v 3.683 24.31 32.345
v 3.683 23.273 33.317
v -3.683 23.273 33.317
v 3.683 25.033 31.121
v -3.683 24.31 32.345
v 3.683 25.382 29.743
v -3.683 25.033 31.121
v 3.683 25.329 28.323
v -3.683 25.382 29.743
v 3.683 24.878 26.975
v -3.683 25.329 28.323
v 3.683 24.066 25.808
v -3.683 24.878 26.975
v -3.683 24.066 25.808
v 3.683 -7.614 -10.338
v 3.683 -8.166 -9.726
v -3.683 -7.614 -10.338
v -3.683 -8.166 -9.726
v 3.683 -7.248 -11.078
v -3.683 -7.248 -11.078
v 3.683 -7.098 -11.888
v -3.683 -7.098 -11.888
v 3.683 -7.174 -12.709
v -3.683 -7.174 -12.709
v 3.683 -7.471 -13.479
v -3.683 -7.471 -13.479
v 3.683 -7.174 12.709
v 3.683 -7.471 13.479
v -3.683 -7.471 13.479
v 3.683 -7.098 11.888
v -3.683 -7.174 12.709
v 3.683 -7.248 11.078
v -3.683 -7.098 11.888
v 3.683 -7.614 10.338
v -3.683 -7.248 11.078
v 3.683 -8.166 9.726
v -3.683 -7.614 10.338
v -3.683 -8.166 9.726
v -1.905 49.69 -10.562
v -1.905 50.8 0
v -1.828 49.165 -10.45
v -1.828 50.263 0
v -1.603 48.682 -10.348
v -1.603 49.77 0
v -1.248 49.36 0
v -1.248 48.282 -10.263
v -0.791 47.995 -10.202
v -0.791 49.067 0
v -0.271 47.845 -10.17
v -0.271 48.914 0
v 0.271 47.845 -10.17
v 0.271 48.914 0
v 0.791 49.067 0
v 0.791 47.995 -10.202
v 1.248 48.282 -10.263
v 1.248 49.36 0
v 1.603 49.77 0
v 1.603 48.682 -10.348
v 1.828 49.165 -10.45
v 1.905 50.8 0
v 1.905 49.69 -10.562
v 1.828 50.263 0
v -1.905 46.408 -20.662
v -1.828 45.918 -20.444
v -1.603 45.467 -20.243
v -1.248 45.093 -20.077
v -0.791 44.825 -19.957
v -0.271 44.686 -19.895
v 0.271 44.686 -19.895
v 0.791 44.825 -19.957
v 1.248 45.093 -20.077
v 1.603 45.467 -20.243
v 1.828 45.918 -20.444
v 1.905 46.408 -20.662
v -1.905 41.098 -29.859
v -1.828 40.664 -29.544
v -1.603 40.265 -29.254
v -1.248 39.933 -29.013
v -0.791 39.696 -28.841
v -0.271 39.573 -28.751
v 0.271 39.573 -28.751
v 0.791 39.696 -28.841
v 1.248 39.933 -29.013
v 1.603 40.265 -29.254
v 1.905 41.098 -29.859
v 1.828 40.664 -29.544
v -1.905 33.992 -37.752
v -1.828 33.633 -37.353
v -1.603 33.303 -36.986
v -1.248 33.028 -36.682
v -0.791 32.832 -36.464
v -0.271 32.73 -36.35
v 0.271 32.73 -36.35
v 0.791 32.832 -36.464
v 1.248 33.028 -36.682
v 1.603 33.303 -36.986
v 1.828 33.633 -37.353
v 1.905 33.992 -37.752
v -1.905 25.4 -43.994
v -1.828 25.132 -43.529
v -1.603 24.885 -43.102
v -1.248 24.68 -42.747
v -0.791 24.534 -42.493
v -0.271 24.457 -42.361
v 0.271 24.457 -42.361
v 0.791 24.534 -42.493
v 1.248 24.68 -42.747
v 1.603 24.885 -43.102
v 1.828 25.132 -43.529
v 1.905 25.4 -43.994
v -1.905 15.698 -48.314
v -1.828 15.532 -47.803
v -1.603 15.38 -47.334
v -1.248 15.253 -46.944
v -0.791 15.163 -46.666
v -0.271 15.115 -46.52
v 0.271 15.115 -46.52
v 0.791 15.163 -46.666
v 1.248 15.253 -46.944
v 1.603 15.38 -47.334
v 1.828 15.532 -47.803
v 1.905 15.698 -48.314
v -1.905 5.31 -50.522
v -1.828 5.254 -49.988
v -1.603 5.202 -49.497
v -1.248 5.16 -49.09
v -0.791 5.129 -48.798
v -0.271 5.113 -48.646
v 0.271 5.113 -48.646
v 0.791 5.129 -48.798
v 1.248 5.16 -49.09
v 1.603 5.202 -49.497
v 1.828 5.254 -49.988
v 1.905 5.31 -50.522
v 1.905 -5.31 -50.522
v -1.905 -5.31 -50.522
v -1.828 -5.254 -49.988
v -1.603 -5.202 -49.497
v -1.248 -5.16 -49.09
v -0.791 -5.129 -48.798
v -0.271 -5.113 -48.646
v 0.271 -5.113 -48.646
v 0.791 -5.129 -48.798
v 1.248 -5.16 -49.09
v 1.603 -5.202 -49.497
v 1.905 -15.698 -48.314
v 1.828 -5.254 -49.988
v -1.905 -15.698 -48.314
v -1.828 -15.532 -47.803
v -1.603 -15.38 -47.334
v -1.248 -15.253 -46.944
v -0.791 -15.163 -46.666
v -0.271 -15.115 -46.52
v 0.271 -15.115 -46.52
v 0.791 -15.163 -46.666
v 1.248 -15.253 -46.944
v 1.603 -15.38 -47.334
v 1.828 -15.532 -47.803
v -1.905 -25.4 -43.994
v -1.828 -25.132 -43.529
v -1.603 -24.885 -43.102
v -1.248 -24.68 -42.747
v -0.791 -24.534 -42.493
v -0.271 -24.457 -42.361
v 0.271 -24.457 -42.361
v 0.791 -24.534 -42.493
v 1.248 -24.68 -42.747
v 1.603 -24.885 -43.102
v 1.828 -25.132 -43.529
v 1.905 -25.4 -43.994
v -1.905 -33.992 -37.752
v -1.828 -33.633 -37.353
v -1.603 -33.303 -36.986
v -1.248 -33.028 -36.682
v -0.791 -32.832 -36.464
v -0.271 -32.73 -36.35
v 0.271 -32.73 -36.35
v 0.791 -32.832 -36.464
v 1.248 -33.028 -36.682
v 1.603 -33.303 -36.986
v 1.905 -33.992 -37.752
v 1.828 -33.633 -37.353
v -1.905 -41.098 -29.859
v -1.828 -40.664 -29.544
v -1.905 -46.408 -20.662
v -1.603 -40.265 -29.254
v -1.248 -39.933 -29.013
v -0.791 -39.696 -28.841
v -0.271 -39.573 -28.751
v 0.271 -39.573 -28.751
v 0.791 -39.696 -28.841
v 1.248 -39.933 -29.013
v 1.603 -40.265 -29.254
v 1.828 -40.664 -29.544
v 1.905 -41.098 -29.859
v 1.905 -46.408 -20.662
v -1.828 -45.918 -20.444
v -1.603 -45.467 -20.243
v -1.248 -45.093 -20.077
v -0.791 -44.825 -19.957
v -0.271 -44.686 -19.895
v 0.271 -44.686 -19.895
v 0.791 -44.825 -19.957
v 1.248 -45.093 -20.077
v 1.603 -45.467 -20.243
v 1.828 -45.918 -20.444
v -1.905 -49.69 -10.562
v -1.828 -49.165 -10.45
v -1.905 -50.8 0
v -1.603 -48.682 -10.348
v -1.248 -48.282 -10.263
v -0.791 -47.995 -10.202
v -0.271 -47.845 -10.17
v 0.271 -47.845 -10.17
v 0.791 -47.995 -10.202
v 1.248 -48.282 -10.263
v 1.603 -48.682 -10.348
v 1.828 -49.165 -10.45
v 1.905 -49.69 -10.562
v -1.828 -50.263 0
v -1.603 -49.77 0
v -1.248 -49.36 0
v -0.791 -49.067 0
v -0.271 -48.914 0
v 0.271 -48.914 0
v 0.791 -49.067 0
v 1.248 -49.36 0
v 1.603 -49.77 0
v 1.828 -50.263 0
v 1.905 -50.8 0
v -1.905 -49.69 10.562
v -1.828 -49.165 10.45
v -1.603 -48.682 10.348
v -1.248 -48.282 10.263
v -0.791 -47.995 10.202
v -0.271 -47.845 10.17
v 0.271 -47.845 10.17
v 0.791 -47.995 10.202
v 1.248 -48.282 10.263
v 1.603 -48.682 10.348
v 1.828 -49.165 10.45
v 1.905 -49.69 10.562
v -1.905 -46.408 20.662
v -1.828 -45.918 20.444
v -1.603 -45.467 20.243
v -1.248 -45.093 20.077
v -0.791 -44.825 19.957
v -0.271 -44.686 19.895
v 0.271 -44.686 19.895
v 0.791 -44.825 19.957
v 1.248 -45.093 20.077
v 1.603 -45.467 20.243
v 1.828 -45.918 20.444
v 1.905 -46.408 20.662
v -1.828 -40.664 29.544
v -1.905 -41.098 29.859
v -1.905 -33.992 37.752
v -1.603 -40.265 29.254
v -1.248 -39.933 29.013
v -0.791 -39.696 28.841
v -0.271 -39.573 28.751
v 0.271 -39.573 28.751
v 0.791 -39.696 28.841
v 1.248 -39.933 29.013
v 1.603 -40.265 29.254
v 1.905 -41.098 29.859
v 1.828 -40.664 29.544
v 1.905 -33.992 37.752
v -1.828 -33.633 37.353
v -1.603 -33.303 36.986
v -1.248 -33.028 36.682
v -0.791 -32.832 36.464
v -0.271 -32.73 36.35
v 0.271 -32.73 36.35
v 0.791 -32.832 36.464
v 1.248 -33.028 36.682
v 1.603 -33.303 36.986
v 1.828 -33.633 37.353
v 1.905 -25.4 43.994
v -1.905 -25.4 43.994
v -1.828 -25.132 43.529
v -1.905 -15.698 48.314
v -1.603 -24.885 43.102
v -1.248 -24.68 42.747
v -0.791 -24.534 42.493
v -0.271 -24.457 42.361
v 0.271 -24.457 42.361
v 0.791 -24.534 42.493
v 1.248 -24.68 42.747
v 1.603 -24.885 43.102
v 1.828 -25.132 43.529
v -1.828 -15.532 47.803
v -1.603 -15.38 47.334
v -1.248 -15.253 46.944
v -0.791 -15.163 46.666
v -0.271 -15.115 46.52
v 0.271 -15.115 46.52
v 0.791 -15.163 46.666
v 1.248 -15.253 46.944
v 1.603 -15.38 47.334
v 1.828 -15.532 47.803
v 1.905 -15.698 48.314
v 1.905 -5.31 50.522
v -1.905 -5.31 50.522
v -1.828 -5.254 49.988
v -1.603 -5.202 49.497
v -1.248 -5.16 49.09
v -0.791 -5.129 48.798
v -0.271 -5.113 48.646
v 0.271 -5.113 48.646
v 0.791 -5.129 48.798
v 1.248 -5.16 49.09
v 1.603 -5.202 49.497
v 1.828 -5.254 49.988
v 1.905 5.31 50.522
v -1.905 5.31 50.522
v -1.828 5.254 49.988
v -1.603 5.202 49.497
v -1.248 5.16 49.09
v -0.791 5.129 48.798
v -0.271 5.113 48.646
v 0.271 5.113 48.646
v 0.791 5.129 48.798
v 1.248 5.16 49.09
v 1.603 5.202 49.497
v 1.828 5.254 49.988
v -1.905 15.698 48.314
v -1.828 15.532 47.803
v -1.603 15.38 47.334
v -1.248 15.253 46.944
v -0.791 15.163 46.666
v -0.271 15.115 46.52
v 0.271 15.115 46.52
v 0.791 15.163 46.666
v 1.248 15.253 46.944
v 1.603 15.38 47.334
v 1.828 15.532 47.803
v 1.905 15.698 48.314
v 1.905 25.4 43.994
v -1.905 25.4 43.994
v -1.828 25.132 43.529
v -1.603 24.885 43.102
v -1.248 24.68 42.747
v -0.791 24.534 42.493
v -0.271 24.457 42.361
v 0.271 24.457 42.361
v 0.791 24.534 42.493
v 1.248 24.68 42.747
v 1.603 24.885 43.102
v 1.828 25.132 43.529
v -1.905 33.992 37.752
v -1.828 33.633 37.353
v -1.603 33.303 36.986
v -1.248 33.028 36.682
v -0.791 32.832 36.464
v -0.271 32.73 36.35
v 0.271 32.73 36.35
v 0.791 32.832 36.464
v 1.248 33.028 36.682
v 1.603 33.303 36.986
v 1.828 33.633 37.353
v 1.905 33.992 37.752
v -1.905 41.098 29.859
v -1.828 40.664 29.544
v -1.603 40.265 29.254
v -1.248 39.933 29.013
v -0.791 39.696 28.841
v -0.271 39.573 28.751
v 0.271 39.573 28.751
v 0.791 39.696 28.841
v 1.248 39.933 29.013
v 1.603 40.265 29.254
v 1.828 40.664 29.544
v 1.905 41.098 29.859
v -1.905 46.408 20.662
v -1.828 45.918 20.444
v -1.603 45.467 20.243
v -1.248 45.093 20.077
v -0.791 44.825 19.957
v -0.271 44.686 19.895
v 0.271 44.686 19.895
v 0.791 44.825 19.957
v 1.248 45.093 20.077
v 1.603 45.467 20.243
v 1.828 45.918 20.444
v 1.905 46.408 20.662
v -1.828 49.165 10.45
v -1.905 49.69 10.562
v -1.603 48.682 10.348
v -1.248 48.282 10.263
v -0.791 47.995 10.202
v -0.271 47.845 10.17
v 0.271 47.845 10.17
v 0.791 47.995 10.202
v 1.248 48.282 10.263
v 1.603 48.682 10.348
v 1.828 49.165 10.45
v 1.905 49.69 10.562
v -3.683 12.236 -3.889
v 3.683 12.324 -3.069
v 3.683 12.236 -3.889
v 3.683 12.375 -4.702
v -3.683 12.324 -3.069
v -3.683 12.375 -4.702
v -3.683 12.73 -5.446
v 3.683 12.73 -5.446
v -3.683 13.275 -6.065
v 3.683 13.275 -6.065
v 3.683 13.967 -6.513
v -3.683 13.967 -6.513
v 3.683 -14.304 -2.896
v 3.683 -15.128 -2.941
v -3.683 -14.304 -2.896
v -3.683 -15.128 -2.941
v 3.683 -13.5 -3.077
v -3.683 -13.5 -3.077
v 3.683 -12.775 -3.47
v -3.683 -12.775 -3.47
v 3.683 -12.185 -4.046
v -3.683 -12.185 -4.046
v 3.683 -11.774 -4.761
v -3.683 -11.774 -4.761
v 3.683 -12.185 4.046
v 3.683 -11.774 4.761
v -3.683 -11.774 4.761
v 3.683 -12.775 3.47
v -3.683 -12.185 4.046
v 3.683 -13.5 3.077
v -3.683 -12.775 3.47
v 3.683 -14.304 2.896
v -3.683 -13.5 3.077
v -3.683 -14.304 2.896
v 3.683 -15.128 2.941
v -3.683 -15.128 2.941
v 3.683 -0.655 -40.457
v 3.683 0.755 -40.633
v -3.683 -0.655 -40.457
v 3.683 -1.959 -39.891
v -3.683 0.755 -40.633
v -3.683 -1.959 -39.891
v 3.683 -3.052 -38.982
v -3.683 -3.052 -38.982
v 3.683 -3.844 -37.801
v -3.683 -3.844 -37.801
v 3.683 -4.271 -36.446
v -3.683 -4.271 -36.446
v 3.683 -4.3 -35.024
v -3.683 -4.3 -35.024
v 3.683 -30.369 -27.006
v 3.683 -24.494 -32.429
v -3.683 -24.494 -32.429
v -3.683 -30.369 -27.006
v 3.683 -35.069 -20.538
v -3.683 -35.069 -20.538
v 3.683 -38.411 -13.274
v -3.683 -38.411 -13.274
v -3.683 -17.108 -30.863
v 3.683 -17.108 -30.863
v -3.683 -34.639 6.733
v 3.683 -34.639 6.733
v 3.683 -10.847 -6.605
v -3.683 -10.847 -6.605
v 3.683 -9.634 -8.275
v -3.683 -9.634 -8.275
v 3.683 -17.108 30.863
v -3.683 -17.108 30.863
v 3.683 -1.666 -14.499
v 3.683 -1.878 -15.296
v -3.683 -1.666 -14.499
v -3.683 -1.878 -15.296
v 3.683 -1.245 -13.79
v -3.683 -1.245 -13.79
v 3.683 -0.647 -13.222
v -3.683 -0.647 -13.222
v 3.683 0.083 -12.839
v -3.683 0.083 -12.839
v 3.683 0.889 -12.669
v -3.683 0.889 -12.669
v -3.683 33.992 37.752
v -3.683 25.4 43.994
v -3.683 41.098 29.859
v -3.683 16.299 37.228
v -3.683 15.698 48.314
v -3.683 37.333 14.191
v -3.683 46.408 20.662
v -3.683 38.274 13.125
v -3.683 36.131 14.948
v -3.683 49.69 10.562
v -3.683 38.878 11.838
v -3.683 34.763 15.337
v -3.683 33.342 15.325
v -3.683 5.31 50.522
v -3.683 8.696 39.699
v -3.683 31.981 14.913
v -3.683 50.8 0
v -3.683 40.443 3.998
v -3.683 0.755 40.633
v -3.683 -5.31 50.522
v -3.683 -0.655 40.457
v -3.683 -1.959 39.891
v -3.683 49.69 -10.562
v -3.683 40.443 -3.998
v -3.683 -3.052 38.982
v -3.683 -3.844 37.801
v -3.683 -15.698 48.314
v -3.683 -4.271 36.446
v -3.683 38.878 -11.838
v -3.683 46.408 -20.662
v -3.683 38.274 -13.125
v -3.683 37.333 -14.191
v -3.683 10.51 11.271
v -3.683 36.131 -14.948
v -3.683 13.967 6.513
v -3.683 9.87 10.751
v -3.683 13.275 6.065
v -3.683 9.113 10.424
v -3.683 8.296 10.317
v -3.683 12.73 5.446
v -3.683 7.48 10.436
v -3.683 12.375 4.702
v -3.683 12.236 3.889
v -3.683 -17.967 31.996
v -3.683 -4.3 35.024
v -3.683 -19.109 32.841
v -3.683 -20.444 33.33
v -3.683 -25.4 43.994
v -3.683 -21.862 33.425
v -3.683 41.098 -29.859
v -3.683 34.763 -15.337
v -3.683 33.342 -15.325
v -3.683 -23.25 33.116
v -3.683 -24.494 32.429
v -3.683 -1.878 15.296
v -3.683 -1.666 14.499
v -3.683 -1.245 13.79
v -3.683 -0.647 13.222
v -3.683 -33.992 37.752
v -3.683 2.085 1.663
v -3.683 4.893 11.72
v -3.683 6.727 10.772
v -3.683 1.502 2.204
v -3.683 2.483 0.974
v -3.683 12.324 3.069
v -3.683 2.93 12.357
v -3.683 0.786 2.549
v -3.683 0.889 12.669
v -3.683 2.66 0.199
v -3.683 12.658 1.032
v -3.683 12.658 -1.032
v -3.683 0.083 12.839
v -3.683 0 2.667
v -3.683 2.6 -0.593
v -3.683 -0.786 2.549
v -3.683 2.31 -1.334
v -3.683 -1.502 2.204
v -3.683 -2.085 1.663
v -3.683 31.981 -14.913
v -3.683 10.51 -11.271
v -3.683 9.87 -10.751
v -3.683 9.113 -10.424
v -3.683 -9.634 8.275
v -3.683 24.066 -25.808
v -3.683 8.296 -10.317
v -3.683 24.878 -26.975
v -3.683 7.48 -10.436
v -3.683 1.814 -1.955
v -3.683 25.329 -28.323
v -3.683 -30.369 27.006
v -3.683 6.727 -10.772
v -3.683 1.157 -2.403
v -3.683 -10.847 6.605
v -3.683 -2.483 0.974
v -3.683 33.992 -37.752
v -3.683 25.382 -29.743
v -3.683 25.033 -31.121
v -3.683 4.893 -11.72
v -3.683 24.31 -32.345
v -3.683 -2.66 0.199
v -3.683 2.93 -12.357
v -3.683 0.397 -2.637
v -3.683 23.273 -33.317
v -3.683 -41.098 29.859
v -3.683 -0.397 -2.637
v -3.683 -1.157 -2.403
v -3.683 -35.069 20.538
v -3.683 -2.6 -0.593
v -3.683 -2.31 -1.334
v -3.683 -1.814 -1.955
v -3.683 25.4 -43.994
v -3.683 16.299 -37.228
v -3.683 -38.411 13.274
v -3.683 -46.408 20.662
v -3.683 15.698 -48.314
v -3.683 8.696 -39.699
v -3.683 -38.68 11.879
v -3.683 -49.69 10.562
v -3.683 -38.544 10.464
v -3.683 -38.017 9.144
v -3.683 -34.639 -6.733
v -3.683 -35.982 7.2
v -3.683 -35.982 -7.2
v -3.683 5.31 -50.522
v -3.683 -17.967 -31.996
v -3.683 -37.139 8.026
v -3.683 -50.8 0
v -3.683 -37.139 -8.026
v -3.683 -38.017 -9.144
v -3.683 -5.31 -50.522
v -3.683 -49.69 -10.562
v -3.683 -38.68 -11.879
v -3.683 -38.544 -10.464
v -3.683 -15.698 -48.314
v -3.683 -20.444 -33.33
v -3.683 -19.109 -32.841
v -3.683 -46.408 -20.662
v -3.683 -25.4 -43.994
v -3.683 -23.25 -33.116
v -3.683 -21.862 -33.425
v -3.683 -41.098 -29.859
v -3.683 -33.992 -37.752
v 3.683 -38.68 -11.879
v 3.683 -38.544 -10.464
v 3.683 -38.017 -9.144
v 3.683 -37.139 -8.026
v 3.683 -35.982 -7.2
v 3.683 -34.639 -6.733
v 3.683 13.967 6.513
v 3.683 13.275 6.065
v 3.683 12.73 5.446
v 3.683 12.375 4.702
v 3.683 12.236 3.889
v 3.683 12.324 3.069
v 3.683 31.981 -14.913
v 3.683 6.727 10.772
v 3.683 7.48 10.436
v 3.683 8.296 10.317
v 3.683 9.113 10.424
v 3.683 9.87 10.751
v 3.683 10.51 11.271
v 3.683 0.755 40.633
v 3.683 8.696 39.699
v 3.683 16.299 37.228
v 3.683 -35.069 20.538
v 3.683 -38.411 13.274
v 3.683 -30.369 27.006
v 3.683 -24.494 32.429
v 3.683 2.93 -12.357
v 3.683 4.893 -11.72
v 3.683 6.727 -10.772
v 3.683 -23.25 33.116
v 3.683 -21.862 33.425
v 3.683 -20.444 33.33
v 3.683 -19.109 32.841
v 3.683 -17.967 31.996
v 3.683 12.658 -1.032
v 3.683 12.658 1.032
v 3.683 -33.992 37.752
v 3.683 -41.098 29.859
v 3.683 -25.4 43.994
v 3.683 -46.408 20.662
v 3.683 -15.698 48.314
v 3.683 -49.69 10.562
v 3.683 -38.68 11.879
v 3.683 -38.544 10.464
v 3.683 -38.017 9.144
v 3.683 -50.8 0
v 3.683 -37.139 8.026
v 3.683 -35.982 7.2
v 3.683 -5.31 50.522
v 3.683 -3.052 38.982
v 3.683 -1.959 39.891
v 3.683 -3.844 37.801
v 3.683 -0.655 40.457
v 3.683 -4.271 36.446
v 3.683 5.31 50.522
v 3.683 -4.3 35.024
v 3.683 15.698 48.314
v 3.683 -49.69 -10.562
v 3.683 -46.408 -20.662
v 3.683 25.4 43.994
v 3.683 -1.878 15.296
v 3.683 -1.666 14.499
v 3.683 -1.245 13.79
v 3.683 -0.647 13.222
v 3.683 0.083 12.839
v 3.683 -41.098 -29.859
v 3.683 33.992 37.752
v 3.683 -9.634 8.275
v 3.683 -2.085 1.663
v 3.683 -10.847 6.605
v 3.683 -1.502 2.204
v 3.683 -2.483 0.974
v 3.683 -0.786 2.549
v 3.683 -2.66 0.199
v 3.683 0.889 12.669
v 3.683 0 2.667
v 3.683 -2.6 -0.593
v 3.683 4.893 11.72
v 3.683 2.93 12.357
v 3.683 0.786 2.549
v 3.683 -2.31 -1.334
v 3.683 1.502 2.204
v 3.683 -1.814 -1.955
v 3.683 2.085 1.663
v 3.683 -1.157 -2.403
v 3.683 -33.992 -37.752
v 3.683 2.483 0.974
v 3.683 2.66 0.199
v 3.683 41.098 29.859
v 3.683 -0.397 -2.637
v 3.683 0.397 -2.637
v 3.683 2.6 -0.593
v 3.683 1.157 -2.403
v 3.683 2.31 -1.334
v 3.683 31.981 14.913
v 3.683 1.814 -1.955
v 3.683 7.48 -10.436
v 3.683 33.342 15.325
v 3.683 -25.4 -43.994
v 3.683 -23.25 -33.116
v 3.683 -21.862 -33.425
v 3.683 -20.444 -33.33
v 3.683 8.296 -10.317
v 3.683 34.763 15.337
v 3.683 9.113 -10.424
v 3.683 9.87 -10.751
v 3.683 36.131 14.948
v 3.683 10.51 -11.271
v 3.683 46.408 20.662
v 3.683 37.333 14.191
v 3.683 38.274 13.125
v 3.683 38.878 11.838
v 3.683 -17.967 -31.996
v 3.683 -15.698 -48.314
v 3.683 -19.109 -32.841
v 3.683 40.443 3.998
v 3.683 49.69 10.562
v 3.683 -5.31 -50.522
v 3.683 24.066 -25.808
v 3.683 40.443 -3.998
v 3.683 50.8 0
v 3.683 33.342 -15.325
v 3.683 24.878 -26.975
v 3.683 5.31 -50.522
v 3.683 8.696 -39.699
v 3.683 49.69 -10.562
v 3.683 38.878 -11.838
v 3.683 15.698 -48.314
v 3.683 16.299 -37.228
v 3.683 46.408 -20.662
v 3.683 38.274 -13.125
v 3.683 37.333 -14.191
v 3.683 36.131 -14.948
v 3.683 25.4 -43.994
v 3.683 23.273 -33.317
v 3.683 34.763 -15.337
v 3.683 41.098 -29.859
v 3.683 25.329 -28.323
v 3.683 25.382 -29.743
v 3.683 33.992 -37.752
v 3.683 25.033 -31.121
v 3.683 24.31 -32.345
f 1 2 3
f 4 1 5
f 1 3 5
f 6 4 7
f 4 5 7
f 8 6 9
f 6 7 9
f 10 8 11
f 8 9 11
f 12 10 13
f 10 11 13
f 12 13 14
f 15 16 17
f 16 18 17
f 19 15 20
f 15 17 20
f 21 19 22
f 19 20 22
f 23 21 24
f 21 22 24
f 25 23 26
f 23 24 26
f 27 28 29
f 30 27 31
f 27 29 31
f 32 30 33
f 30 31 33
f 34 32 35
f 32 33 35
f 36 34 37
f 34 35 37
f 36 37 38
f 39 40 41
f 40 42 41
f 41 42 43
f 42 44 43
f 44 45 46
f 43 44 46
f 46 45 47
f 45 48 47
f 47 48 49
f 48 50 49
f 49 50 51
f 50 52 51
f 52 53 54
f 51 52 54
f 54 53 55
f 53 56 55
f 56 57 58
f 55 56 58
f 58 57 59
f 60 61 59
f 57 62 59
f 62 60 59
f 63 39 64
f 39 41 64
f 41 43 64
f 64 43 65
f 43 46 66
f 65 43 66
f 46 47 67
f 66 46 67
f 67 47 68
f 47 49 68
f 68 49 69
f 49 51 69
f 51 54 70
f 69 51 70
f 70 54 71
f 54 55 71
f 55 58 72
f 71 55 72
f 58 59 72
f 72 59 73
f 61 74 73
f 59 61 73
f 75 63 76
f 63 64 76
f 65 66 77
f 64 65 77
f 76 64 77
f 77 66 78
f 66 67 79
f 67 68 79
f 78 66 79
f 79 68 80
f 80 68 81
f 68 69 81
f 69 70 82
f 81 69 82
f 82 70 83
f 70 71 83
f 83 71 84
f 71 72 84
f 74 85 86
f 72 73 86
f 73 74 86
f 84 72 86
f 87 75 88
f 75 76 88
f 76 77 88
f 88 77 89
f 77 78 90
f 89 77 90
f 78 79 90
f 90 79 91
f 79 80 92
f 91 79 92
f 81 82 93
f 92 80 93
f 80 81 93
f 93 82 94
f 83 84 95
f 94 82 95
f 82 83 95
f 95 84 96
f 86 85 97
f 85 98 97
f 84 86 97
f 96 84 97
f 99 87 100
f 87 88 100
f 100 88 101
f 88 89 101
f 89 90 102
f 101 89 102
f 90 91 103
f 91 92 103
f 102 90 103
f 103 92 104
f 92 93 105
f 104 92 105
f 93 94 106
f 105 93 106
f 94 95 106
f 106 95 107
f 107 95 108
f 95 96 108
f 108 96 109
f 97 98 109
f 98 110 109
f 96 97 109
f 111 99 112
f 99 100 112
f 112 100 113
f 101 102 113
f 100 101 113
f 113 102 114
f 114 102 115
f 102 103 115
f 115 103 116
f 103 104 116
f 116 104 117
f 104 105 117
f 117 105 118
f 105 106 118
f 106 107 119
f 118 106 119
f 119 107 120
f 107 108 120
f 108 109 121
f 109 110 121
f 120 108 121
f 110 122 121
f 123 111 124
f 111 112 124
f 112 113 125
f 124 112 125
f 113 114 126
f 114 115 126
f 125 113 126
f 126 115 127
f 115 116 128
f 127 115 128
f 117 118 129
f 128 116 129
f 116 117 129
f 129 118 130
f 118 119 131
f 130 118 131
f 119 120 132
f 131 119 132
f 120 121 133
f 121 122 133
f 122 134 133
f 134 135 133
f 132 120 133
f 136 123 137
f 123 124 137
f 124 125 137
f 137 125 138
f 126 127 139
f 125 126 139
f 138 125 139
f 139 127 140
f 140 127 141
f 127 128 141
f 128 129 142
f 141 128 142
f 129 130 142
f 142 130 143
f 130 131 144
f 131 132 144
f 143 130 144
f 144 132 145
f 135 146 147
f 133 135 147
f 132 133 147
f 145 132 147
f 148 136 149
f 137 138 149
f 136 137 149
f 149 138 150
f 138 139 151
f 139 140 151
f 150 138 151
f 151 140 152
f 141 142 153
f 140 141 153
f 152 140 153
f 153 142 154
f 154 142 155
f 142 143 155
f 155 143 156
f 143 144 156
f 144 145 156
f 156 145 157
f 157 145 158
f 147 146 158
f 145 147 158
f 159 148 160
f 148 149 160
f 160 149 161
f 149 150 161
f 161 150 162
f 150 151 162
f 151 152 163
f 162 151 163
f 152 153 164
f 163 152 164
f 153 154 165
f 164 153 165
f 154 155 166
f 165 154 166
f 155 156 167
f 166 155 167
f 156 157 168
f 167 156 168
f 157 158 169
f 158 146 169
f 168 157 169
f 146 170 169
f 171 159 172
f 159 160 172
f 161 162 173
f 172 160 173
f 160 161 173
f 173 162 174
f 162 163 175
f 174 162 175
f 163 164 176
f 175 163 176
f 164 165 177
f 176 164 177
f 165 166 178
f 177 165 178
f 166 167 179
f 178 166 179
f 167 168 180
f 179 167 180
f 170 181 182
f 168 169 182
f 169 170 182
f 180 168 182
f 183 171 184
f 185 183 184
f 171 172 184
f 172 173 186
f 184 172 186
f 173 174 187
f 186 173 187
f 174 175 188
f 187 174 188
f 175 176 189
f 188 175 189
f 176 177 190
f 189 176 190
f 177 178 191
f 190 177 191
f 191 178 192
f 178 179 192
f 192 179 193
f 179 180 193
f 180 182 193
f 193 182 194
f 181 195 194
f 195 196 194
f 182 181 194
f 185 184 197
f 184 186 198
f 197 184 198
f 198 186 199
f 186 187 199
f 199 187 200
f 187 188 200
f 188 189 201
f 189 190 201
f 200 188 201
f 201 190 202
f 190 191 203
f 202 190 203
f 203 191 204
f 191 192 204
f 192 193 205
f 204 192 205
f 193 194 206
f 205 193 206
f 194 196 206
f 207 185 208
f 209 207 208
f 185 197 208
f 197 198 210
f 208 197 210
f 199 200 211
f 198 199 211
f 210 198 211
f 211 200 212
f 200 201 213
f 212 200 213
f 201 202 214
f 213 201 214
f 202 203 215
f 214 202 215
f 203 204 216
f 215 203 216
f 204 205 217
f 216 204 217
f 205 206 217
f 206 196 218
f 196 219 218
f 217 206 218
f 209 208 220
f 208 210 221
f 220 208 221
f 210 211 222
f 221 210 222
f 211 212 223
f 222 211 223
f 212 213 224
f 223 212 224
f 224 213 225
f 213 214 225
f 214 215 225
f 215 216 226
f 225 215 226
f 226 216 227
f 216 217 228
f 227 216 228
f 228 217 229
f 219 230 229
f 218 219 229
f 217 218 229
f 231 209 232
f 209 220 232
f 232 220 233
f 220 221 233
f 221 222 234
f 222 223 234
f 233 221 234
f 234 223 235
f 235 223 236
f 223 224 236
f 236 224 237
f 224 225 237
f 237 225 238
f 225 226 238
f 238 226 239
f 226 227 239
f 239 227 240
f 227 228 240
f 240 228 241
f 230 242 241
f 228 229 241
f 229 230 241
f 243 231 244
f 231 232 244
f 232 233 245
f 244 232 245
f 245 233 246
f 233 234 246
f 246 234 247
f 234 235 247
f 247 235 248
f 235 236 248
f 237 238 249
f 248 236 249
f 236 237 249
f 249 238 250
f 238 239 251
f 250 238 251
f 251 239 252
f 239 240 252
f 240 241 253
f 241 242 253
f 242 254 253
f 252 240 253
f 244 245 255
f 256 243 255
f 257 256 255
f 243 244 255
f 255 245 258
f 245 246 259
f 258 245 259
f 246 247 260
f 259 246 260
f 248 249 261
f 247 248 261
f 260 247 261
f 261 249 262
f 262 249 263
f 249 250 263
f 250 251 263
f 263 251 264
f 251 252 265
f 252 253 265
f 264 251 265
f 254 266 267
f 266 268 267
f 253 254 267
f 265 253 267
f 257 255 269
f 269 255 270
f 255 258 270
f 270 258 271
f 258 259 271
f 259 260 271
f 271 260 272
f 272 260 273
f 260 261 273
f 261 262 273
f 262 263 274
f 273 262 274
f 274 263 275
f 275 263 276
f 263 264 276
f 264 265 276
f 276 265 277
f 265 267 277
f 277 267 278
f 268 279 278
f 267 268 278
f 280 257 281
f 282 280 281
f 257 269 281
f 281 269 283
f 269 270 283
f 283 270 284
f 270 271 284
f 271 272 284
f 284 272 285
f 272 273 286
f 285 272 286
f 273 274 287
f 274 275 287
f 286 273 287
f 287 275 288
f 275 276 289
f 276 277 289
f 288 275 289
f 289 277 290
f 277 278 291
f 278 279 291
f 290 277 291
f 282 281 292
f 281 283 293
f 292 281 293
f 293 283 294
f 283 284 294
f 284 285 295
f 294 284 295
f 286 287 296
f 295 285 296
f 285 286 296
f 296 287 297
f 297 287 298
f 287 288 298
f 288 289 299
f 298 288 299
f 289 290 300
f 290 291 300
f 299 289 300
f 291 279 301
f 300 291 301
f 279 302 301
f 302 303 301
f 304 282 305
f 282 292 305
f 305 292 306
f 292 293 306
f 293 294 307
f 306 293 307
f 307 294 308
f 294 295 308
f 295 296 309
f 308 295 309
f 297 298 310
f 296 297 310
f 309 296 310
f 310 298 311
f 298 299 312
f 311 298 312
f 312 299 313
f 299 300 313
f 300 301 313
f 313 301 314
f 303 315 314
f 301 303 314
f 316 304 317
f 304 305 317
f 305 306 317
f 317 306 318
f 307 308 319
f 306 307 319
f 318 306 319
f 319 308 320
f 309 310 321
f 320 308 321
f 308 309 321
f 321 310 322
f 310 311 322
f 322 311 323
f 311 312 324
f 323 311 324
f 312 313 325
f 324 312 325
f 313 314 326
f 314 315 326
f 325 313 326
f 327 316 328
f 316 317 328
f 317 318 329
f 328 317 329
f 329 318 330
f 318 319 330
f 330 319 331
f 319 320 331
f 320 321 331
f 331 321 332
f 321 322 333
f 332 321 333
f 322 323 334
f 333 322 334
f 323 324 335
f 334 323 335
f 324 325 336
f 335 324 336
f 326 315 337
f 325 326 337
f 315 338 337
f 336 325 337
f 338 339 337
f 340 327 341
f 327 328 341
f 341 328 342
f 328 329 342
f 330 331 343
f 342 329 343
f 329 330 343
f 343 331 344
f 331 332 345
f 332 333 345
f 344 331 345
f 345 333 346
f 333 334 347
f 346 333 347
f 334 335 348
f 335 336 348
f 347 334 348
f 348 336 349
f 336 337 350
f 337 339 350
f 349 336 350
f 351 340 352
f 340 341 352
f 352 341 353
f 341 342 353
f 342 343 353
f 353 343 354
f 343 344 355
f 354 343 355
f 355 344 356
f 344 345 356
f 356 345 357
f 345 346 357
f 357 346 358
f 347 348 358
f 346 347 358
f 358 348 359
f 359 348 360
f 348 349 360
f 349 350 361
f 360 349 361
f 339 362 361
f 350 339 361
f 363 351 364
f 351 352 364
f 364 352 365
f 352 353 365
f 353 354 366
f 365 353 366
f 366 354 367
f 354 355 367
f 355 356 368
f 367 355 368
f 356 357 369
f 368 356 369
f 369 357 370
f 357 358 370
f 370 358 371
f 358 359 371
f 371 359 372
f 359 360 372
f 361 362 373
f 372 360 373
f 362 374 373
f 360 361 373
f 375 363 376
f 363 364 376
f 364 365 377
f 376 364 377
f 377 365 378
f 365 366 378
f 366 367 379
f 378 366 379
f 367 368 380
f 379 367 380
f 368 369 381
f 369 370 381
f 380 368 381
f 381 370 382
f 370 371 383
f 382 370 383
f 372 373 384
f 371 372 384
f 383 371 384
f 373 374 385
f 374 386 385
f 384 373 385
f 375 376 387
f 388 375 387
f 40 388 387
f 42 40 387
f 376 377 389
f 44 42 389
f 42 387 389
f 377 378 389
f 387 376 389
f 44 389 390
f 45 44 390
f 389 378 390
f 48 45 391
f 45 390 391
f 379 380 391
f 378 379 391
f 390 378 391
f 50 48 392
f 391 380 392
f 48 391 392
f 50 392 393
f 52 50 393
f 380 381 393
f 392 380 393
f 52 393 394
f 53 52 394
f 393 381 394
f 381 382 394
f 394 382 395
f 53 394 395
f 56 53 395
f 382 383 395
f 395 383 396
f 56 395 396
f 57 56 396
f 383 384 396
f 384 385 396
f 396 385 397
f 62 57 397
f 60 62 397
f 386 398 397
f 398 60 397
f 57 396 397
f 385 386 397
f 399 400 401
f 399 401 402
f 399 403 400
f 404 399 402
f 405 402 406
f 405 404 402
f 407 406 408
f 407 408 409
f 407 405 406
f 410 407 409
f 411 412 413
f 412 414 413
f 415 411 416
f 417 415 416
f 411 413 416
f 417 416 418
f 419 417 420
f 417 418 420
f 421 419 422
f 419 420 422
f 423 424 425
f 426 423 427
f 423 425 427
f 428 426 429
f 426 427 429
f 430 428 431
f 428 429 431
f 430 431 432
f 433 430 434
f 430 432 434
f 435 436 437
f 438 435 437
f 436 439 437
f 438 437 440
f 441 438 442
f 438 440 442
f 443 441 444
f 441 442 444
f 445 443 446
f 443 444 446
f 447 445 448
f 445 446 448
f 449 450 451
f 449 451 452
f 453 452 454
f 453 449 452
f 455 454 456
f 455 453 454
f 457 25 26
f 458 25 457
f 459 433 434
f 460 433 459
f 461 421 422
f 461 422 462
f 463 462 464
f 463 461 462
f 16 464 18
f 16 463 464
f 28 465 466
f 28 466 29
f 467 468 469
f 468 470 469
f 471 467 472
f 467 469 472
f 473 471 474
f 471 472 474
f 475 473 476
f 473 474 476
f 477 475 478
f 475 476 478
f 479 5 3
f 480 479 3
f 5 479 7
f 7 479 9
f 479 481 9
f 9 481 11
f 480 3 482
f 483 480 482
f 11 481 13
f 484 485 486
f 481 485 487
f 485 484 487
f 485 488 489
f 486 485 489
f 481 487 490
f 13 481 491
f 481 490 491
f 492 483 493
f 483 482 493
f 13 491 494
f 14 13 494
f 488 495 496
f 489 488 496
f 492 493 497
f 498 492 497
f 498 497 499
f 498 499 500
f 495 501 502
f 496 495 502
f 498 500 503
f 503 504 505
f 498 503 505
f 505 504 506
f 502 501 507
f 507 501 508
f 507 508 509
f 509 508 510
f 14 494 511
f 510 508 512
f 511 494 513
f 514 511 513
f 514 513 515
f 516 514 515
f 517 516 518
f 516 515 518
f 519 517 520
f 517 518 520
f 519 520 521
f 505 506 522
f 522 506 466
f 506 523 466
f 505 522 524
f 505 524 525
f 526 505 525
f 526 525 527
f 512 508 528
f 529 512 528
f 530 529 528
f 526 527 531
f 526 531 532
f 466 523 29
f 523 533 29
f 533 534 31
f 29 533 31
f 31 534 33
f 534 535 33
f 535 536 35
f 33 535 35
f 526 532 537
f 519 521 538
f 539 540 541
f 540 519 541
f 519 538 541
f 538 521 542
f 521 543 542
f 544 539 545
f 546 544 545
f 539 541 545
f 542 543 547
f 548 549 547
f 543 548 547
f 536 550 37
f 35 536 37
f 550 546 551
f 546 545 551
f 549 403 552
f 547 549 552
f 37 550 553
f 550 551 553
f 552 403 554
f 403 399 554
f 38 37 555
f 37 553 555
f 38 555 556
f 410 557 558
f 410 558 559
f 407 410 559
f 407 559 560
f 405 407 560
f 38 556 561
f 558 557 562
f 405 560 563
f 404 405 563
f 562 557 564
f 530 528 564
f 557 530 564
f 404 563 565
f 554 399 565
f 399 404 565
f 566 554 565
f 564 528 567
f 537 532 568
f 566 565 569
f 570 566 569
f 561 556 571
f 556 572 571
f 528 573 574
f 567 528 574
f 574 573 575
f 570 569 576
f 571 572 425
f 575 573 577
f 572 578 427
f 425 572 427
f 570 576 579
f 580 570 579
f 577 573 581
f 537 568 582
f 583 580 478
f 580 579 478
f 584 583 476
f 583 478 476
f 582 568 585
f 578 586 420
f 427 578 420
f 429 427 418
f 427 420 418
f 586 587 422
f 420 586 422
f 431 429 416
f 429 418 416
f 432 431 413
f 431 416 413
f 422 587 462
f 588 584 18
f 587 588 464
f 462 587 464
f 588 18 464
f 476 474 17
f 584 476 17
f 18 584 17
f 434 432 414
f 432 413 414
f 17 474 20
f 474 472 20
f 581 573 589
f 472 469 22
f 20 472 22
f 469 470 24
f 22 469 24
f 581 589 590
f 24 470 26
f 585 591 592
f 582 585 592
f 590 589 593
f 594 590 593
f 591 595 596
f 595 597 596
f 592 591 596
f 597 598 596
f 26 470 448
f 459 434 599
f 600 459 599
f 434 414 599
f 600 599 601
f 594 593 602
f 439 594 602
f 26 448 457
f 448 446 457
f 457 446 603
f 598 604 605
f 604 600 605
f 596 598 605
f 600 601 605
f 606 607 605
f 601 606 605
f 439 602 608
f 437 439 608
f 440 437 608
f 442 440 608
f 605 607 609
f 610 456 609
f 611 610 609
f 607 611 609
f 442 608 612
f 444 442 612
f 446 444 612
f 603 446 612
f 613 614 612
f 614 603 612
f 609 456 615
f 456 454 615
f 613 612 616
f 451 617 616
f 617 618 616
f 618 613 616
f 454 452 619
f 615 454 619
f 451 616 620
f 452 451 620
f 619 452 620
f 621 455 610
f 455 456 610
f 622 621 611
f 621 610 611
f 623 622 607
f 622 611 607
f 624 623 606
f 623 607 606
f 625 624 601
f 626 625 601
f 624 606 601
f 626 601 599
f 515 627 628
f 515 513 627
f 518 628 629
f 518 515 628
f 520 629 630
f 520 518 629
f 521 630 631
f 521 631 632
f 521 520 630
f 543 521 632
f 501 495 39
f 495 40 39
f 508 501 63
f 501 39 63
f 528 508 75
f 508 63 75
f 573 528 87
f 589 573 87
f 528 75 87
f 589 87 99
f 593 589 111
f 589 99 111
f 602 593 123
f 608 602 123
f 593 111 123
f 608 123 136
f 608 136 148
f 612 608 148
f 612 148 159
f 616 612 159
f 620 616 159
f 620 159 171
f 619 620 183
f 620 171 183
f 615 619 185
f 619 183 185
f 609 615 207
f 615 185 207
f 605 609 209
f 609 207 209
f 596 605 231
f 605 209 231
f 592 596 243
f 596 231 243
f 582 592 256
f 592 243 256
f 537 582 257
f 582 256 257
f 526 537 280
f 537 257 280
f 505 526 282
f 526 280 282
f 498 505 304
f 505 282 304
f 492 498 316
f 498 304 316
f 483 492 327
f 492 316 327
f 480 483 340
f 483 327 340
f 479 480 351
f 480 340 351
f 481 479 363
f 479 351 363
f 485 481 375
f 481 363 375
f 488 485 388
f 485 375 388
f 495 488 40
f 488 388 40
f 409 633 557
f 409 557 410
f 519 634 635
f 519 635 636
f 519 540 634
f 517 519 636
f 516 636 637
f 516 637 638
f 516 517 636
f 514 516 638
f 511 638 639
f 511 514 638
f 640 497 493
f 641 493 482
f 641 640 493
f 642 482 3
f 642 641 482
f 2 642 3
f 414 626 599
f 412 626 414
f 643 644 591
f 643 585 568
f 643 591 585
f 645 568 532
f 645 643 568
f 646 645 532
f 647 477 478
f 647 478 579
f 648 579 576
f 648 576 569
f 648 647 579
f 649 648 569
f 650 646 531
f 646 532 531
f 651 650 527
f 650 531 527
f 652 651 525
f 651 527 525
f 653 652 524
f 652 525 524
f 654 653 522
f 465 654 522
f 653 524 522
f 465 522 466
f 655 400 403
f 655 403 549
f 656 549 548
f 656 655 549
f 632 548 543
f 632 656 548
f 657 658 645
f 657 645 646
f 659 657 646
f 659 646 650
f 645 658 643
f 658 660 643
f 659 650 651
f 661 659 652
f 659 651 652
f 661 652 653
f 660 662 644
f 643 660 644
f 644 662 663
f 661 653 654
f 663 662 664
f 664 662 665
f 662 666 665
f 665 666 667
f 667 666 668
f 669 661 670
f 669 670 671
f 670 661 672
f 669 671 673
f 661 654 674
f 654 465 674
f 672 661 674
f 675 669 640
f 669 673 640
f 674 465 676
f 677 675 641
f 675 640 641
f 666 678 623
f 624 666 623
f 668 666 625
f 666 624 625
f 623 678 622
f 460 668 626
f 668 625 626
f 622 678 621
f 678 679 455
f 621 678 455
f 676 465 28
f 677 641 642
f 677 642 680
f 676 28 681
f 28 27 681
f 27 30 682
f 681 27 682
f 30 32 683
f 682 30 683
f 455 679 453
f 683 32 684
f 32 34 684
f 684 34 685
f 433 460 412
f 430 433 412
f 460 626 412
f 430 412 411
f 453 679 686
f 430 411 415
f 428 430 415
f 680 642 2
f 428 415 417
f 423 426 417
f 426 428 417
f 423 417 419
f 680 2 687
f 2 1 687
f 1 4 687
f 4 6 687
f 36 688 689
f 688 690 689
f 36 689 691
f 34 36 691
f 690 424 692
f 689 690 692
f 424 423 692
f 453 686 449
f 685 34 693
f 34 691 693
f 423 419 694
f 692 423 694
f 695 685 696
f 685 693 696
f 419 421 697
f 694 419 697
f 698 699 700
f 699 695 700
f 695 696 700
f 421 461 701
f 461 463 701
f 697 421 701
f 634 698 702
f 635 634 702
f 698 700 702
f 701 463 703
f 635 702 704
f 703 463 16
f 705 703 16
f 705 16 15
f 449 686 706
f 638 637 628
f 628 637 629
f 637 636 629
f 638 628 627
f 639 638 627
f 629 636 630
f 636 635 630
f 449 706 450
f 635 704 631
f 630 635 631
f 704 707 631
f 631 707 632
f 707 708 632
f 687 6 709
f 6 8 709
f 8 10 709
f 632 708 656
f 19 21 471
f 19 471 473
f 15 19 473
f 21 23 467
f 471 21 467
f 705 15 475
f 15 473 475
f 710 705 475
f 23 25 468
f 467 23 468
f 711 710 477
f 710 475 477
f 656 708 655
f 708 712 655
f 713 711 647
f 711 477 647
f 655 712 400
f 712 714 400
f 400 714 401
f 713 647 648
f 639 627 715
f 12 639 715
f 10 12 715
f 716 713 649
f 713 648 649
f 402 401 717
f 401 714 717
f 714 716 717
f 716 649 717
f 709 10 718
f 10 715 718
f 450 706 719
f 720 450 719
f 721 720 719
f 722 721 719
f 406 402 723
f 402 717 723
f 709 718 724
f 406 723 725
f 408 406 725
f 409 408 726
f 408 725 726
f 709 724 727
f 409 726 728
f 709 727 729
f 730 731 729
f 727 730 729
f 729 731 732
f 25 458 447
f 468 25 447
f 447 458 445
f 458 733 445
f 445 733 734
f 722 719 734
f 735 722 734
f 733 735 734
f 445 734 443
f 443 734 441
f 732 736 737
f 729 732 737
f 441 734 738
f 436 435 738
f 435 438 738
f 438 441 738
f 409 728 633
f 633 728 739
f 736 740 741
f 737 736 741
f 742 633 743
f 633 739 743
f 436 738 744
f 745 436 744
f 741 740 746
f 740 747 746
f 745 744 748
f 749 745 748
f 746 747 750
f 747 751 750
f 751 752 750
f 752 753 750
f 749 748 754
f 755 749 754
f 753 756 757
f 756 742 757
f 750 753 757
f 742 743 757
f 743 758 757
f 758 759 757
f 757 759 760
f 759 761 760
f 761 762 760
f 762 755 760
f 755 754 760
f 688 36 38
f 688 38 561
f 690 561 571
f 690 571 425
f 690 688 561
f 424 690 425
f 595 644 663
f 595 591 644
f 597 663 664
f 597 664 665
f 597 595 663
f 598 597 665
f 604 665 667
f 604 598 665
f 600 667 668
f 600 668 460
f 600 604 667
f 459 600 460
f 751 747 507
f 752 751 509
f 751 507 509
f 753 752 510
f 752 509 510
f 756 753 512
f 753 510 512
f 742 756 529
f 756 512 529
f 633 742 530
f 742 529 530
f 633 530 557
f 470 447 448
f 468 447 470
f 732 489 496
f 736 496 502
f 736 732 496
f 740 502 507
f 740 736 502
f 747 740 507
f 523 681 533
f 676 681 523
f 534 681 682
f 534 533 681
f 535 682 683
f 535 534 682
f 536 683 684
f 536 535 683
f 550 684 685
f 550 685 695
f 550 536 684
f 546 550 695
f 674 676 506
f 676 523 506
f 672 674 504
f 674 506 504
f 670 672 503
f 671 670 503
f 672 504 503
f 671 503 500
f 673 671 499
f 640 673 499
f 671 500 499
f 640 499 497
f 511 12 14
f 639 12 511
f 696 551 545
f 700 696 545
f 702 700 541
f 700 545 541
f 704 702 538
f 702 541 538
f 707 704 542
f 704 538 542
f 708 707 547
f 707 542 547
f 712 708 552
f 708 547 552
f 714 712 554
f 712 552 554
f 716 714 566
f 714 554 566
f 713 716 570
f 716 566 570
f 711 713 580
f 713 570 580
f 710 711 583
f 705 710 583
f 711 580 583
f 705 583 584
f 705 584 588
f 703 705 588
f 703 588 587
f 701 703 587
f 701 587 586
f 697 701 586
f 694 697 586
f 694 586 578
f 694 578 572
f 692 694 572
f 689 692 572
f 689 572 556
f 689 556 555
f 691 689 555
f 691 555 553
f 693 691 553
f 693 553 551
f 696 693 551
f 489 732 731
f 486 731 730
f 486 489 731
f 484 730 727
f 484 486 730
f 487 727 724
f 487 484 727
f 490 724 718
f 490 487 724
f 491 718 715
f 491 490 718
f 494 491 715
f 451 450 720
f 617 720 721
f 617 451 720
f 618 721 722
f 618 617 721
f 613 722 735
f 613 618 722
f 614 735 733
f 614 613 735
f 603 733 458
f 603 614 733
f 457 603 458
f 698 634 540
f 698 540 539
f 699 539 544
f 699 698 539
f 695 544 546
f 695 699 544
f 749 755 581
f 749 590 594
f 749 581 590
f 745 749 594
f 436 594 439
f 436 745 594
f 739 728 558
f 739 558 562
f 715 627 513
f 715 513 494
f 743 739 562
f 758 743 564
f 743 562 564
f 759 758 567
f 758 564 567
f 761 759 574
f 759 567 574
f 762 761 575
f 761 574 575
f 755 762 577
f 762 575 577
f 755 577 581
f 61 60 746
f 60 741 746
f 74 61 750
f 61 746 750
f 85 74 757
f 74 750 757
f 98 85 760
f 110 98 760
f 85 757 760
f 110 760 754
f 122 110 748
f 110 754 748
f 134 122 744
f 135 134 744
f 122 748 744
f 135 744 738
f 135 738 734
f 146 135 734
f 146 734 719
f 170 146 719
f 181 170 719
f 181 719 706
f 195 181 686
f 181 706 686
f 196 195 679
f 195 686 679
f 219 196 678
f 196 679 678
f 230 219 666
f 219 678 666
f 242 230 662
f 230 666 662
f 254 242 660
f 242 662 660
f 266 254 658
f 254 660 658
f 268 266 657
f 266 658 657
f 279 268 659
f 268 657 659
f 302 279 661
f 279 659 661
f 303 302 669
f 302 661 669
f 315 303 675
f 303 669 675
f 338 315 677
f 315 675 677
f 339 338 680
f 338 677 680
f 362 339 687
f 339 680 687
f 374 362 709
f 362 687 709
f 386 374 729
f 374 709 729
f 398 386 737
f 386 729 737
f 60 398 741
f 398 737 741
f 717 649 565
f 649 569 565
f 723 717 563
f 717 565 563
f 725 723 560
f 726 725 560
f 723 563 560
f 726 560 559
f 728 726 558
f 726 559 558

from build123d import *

# Parameters (mm, degrees)
CUT_EXTRUDE1_DEPTH = 8.366
FILLET1_R          = 5
FILLET2_R          = 5
FILLET3_R          = 5
FILLET4_R          = 5
FILLET5_R          = 5
FILLET6_R          = 5
FILLET7_R          = 5
FILLET8_R          = 5
FILLET9_R          = 5
FILLET10_R         = 5
FILLET11_R         = 3
FILLET12_R         = 3
FILLET13_R         = 3
FILLET14_R         = 3
FILLET15_R         = 3
FILLET16_R         = 3
FILLET17_R         = 3
FILLET18_R         = 3
FILLET19_R         = 3
FILLET20_R         = 3
SKETCH4_R          = 2.667
CUT_EXTRUDE2_DEPTH = 8.366


with BuildPart() as part:
    # Sketch1 → Revolve1 (revolve)
    with BuildSketch(Plane.XY):
        with BuildLine():
            Line((1.905, 50.8), (3.683, 50.8))
            Line((3.683, 50.8), (3.683, 0))
            Line((3.683, 0), (-3.683, 0))
            Line((-3.683, 0), (-3.683, 50.8))
            Line((-3.683, 50.8), (-1.905, 50.8))
            ThreePointArc((-1.905, 50.8), (0, 48.895), (1.905, 50.8))
        make_face()
    revolve(axis=Axis((3.683, 0, 0), (-1, 0, 0)))

    # Sketch2 → Cut-Extrude1 (cut, through all)
    with BuildSketch(Plane(origin=(3.683, 0, 0), x_dir=(0, 0, -1), z_dir=(1, 0, 0))):
        with BuildLine():
            Line((-5.367251924, 11.510108895), (-17.175206157, 36.832348465))
            ThreePointArc((-17.175206157, 36.832348465), (0, 40.64), (17.175206157, 36.832348465))
            Line((17.175206157, 36.832348465), (5.367251924, 11.510108895))
            ThreePointArc((5.367251924, 11.510108895), (0, 12.7), (-5.367251924, 11.510108895))
        make_face()
        with BuildLine():
            Line((9.288192011, 8.661379173), (29.722214434, 27.716413353))
            ThreePointArc((29.722214434, 27.716413353), (38.650936822, 12.558450651), (40.337075603, -4.952770116))
            Line((40.337075603, -4.952770116), (12.605336126, -1.547740661))
            ThreePointArc((12.605336126, -1.547740661), (12.078417757, 3.924515829), (9.288192011, 8.661379173))
        make_face()
        with BuildLine():
            Line((11.107670281, -6.157082177), (35.544544898, -19.702662967))
            ThreePointArc((35.544544898, -19.702662967), (23.887592653, -32.878450651), (7.754477572, -39.893328735))
            Line((7.754477572, -39.893328735), (2.423274241, -12.46666523))
            ThreePointArc((2.423274241, -12.46666523), (7.464872704, -10.274515829), (11.107670281, -6.157082177))
        make_face()
        with BuildLine():
            Line((-2.423274241, -12.46666523), (-7.754477572, -39.893328735))
            ThreePointArc((-7.754477572, -39.893328735), (-23.887592653, -32.878450651), (-35.544544898, -19.702662967))
            Line((-35.544544898, -19.702662967), (-11.107670281, -6.157082177))
            ThreePointArc((-11.107670281, -6.157082177), (-7.464872704, -10.274515829), (-2.423274241, -12.46666523))
        make_face()
        with BuildLine():
            Line((-12.605336126, -1.547740661), (-40.337075603, -4.952770116))
            ThreePointArc((-40.337075603, -4.952770116), (-38.650936822, 12.558450651), (-29.722214434, 27.716413353))
            Line((-29.722214434, 27.716413353), (-9.288192011, 8.661379173))
            ThreePointArc((-9.288192011, 8.661379173), (-12.078417757, 3.924515829), (-12.605336126, -1.547740661))
        make_face()
    extrude(amount=-CUT_EXTRUDE1_DEPTH, mode=Mode.SUBTRACT)

    # Fillet1
    fillet1_edges = [part.edges().sort_by_distance(p)[0] for p in [
        (0, -39.893328735, -7.754477572),
    ]]
    fillet(fillet1_edges, radius=FILLET1_R)

    # Fillet2
    fillet2_edges = [part.edges().sort_by_distance(p)[0] for p in [
        (0, -19.702662967, -35.544544898),
    ]]
    fillet(fillet2_edges, radius=FILLET2_R)

    # Fillet3
    fillet3_edges = [part.edges().sort_by_distance(p)[0] for p in [
        (0, 27.716413353, -29.722214434),
    ]]
    fillet(fillet3_edges, radius=FILLET3_R)

    # Fillet4
    fillet4_edges = [part.edges().sort_by_distance(p)[0] for p in [
        (0, -4.952770116, -40.337075603),
    ]]
    fillet(fillet4_edges, radius=FILLET4_R)

    # Fillet5
    fillet5_edges = [part.edges().sort_by_distance(p)[0] for p in [
        (0, 36.832348465, -17.175206157),
    ]]
    fillet(fillet5_edges, radius=FILLET5_R)

    # Fillet6
    fillet6_edges = [part.edges().sort_by_distance(p)[0] for p in [
        (0, 36.832348465, 17.175206157),
    ]]
    fillet(fillet6_edges, radius=FILLET6_R)

    # Fillet7
    fillet7_edges = [part.edges().sort_by_distance(p)[0] for p in [
        (0, -4.952770116, 40.337075603),
    ]]
    fillet(fillet7_edges, radius=FILLET7_R)

    # Fillet8
    fillet8_edges = [part.edges().sort_by_distance(p)[0] for p in [
        (0, 27.716413353, 29.722214434),
    ]]
    fillet(fillet8_edges, radius=FILLET8_R)

    # Fillet9
    fillet9_edges = [part.edges().sort_by_distance(p)[0] for p in [
        (0, -19.702662967, 35.544544898),
    ]]
    fillet(fillet9_edges, radius=FILLET9_R)

    # Fillet10
    fillet10_edges = [part.edges().sort_by_distance(p)[0] for p in [
        (0, -39.893328735, 7.754477572),
    ]]
    fillet(fillet10_edges, radius=FILLET10_R)

    # Fillet11
    fillet11_edges = [part.edges().sort_by_distance(p)[0] for p in [
        (0, 11.510108895, 5.367251924),
    ]]
    fillet(fillet11_edges, radius=FILLET11_R)

    # Fillet12
    fillet12_edges = [part.edges().sort_by_distance(p)[0] for p in [
        (0, 11.510108895, -5.367251924),
    ]]
    fillet(fillet12_edges, radius=FILLET12_R)

    # Fillet13
    fillet13_edges = [part.edges().sort_by_distance(p)[0] for p in [
        (0, -1.547740661, 12.605336126),
    ]]
    fillet(fillet13_edges, radius=FILLET13_R)

    # Fillet14
    fillet14_edges = [part.edges().sort_by_distance(p)[0] for p in [
        (0, 8.661379173, 9.288192011),
    ]]
    fillet(fillet14_edges, radius=FILLET14_R)

    # Fillet15
    fillet15_edges = [part.edges().sort_by_distance(p)[0] for p in [
        (0, -6.157082177, 11.107670281),
    ]]
    fillet(fillet15_edges, radius=FILLET15_R)

    # Fillet16
    fillet16_edges = [part.edges().sort_by_distance(p)[0] for p in [
        (0, -12.46666523, 2.423274241),
    ]]
    fillet(fillet16_edges, radius=FILLET16_R)

    # Fillet17
    fillet17_edges = [part.edges().sort_by_distance(p)[0] for p in [
        (0, -12.46666523, -2.423274241),
    ]]
    fillet(fillet17_edges, radius=FILLET17_R)

    # Fillet18
    fillet18_edges = [part.edges().sort_by_distance(p)[0] for p in [
        (0, -6.157082177, -11.107670281),
    ]]
    fillet(fillet18_edges, radius=FILLET18_R)

    # Fillet19
    fillet19_edges = [part.edges().sort_by_distance(p)[0] for p in [
        (0, -1.547740661, -12.605336126),
    ]]
    fillet(fillet19_edges, radius=FILLET19_R)

    # Fillet20
    fillet20_edges = [part.edges().sort_by_distance(p)[0] for p in [
        (0, 8.661379173, -9.288192011),
    ]]
    fillet(fillet20_edges, radius=FILLET20_R)

    # Sketch4 → Cut-Extrude2 (cut, through all)
    with BuildSketch(Plane.ZY.offset(3.683)):
        Circle(SKETCH4_R)
    extrude(amount=-CUT_EXTRUDE2_DEPTH, mode=Mode.SUBTRACT)


solid = part.part
